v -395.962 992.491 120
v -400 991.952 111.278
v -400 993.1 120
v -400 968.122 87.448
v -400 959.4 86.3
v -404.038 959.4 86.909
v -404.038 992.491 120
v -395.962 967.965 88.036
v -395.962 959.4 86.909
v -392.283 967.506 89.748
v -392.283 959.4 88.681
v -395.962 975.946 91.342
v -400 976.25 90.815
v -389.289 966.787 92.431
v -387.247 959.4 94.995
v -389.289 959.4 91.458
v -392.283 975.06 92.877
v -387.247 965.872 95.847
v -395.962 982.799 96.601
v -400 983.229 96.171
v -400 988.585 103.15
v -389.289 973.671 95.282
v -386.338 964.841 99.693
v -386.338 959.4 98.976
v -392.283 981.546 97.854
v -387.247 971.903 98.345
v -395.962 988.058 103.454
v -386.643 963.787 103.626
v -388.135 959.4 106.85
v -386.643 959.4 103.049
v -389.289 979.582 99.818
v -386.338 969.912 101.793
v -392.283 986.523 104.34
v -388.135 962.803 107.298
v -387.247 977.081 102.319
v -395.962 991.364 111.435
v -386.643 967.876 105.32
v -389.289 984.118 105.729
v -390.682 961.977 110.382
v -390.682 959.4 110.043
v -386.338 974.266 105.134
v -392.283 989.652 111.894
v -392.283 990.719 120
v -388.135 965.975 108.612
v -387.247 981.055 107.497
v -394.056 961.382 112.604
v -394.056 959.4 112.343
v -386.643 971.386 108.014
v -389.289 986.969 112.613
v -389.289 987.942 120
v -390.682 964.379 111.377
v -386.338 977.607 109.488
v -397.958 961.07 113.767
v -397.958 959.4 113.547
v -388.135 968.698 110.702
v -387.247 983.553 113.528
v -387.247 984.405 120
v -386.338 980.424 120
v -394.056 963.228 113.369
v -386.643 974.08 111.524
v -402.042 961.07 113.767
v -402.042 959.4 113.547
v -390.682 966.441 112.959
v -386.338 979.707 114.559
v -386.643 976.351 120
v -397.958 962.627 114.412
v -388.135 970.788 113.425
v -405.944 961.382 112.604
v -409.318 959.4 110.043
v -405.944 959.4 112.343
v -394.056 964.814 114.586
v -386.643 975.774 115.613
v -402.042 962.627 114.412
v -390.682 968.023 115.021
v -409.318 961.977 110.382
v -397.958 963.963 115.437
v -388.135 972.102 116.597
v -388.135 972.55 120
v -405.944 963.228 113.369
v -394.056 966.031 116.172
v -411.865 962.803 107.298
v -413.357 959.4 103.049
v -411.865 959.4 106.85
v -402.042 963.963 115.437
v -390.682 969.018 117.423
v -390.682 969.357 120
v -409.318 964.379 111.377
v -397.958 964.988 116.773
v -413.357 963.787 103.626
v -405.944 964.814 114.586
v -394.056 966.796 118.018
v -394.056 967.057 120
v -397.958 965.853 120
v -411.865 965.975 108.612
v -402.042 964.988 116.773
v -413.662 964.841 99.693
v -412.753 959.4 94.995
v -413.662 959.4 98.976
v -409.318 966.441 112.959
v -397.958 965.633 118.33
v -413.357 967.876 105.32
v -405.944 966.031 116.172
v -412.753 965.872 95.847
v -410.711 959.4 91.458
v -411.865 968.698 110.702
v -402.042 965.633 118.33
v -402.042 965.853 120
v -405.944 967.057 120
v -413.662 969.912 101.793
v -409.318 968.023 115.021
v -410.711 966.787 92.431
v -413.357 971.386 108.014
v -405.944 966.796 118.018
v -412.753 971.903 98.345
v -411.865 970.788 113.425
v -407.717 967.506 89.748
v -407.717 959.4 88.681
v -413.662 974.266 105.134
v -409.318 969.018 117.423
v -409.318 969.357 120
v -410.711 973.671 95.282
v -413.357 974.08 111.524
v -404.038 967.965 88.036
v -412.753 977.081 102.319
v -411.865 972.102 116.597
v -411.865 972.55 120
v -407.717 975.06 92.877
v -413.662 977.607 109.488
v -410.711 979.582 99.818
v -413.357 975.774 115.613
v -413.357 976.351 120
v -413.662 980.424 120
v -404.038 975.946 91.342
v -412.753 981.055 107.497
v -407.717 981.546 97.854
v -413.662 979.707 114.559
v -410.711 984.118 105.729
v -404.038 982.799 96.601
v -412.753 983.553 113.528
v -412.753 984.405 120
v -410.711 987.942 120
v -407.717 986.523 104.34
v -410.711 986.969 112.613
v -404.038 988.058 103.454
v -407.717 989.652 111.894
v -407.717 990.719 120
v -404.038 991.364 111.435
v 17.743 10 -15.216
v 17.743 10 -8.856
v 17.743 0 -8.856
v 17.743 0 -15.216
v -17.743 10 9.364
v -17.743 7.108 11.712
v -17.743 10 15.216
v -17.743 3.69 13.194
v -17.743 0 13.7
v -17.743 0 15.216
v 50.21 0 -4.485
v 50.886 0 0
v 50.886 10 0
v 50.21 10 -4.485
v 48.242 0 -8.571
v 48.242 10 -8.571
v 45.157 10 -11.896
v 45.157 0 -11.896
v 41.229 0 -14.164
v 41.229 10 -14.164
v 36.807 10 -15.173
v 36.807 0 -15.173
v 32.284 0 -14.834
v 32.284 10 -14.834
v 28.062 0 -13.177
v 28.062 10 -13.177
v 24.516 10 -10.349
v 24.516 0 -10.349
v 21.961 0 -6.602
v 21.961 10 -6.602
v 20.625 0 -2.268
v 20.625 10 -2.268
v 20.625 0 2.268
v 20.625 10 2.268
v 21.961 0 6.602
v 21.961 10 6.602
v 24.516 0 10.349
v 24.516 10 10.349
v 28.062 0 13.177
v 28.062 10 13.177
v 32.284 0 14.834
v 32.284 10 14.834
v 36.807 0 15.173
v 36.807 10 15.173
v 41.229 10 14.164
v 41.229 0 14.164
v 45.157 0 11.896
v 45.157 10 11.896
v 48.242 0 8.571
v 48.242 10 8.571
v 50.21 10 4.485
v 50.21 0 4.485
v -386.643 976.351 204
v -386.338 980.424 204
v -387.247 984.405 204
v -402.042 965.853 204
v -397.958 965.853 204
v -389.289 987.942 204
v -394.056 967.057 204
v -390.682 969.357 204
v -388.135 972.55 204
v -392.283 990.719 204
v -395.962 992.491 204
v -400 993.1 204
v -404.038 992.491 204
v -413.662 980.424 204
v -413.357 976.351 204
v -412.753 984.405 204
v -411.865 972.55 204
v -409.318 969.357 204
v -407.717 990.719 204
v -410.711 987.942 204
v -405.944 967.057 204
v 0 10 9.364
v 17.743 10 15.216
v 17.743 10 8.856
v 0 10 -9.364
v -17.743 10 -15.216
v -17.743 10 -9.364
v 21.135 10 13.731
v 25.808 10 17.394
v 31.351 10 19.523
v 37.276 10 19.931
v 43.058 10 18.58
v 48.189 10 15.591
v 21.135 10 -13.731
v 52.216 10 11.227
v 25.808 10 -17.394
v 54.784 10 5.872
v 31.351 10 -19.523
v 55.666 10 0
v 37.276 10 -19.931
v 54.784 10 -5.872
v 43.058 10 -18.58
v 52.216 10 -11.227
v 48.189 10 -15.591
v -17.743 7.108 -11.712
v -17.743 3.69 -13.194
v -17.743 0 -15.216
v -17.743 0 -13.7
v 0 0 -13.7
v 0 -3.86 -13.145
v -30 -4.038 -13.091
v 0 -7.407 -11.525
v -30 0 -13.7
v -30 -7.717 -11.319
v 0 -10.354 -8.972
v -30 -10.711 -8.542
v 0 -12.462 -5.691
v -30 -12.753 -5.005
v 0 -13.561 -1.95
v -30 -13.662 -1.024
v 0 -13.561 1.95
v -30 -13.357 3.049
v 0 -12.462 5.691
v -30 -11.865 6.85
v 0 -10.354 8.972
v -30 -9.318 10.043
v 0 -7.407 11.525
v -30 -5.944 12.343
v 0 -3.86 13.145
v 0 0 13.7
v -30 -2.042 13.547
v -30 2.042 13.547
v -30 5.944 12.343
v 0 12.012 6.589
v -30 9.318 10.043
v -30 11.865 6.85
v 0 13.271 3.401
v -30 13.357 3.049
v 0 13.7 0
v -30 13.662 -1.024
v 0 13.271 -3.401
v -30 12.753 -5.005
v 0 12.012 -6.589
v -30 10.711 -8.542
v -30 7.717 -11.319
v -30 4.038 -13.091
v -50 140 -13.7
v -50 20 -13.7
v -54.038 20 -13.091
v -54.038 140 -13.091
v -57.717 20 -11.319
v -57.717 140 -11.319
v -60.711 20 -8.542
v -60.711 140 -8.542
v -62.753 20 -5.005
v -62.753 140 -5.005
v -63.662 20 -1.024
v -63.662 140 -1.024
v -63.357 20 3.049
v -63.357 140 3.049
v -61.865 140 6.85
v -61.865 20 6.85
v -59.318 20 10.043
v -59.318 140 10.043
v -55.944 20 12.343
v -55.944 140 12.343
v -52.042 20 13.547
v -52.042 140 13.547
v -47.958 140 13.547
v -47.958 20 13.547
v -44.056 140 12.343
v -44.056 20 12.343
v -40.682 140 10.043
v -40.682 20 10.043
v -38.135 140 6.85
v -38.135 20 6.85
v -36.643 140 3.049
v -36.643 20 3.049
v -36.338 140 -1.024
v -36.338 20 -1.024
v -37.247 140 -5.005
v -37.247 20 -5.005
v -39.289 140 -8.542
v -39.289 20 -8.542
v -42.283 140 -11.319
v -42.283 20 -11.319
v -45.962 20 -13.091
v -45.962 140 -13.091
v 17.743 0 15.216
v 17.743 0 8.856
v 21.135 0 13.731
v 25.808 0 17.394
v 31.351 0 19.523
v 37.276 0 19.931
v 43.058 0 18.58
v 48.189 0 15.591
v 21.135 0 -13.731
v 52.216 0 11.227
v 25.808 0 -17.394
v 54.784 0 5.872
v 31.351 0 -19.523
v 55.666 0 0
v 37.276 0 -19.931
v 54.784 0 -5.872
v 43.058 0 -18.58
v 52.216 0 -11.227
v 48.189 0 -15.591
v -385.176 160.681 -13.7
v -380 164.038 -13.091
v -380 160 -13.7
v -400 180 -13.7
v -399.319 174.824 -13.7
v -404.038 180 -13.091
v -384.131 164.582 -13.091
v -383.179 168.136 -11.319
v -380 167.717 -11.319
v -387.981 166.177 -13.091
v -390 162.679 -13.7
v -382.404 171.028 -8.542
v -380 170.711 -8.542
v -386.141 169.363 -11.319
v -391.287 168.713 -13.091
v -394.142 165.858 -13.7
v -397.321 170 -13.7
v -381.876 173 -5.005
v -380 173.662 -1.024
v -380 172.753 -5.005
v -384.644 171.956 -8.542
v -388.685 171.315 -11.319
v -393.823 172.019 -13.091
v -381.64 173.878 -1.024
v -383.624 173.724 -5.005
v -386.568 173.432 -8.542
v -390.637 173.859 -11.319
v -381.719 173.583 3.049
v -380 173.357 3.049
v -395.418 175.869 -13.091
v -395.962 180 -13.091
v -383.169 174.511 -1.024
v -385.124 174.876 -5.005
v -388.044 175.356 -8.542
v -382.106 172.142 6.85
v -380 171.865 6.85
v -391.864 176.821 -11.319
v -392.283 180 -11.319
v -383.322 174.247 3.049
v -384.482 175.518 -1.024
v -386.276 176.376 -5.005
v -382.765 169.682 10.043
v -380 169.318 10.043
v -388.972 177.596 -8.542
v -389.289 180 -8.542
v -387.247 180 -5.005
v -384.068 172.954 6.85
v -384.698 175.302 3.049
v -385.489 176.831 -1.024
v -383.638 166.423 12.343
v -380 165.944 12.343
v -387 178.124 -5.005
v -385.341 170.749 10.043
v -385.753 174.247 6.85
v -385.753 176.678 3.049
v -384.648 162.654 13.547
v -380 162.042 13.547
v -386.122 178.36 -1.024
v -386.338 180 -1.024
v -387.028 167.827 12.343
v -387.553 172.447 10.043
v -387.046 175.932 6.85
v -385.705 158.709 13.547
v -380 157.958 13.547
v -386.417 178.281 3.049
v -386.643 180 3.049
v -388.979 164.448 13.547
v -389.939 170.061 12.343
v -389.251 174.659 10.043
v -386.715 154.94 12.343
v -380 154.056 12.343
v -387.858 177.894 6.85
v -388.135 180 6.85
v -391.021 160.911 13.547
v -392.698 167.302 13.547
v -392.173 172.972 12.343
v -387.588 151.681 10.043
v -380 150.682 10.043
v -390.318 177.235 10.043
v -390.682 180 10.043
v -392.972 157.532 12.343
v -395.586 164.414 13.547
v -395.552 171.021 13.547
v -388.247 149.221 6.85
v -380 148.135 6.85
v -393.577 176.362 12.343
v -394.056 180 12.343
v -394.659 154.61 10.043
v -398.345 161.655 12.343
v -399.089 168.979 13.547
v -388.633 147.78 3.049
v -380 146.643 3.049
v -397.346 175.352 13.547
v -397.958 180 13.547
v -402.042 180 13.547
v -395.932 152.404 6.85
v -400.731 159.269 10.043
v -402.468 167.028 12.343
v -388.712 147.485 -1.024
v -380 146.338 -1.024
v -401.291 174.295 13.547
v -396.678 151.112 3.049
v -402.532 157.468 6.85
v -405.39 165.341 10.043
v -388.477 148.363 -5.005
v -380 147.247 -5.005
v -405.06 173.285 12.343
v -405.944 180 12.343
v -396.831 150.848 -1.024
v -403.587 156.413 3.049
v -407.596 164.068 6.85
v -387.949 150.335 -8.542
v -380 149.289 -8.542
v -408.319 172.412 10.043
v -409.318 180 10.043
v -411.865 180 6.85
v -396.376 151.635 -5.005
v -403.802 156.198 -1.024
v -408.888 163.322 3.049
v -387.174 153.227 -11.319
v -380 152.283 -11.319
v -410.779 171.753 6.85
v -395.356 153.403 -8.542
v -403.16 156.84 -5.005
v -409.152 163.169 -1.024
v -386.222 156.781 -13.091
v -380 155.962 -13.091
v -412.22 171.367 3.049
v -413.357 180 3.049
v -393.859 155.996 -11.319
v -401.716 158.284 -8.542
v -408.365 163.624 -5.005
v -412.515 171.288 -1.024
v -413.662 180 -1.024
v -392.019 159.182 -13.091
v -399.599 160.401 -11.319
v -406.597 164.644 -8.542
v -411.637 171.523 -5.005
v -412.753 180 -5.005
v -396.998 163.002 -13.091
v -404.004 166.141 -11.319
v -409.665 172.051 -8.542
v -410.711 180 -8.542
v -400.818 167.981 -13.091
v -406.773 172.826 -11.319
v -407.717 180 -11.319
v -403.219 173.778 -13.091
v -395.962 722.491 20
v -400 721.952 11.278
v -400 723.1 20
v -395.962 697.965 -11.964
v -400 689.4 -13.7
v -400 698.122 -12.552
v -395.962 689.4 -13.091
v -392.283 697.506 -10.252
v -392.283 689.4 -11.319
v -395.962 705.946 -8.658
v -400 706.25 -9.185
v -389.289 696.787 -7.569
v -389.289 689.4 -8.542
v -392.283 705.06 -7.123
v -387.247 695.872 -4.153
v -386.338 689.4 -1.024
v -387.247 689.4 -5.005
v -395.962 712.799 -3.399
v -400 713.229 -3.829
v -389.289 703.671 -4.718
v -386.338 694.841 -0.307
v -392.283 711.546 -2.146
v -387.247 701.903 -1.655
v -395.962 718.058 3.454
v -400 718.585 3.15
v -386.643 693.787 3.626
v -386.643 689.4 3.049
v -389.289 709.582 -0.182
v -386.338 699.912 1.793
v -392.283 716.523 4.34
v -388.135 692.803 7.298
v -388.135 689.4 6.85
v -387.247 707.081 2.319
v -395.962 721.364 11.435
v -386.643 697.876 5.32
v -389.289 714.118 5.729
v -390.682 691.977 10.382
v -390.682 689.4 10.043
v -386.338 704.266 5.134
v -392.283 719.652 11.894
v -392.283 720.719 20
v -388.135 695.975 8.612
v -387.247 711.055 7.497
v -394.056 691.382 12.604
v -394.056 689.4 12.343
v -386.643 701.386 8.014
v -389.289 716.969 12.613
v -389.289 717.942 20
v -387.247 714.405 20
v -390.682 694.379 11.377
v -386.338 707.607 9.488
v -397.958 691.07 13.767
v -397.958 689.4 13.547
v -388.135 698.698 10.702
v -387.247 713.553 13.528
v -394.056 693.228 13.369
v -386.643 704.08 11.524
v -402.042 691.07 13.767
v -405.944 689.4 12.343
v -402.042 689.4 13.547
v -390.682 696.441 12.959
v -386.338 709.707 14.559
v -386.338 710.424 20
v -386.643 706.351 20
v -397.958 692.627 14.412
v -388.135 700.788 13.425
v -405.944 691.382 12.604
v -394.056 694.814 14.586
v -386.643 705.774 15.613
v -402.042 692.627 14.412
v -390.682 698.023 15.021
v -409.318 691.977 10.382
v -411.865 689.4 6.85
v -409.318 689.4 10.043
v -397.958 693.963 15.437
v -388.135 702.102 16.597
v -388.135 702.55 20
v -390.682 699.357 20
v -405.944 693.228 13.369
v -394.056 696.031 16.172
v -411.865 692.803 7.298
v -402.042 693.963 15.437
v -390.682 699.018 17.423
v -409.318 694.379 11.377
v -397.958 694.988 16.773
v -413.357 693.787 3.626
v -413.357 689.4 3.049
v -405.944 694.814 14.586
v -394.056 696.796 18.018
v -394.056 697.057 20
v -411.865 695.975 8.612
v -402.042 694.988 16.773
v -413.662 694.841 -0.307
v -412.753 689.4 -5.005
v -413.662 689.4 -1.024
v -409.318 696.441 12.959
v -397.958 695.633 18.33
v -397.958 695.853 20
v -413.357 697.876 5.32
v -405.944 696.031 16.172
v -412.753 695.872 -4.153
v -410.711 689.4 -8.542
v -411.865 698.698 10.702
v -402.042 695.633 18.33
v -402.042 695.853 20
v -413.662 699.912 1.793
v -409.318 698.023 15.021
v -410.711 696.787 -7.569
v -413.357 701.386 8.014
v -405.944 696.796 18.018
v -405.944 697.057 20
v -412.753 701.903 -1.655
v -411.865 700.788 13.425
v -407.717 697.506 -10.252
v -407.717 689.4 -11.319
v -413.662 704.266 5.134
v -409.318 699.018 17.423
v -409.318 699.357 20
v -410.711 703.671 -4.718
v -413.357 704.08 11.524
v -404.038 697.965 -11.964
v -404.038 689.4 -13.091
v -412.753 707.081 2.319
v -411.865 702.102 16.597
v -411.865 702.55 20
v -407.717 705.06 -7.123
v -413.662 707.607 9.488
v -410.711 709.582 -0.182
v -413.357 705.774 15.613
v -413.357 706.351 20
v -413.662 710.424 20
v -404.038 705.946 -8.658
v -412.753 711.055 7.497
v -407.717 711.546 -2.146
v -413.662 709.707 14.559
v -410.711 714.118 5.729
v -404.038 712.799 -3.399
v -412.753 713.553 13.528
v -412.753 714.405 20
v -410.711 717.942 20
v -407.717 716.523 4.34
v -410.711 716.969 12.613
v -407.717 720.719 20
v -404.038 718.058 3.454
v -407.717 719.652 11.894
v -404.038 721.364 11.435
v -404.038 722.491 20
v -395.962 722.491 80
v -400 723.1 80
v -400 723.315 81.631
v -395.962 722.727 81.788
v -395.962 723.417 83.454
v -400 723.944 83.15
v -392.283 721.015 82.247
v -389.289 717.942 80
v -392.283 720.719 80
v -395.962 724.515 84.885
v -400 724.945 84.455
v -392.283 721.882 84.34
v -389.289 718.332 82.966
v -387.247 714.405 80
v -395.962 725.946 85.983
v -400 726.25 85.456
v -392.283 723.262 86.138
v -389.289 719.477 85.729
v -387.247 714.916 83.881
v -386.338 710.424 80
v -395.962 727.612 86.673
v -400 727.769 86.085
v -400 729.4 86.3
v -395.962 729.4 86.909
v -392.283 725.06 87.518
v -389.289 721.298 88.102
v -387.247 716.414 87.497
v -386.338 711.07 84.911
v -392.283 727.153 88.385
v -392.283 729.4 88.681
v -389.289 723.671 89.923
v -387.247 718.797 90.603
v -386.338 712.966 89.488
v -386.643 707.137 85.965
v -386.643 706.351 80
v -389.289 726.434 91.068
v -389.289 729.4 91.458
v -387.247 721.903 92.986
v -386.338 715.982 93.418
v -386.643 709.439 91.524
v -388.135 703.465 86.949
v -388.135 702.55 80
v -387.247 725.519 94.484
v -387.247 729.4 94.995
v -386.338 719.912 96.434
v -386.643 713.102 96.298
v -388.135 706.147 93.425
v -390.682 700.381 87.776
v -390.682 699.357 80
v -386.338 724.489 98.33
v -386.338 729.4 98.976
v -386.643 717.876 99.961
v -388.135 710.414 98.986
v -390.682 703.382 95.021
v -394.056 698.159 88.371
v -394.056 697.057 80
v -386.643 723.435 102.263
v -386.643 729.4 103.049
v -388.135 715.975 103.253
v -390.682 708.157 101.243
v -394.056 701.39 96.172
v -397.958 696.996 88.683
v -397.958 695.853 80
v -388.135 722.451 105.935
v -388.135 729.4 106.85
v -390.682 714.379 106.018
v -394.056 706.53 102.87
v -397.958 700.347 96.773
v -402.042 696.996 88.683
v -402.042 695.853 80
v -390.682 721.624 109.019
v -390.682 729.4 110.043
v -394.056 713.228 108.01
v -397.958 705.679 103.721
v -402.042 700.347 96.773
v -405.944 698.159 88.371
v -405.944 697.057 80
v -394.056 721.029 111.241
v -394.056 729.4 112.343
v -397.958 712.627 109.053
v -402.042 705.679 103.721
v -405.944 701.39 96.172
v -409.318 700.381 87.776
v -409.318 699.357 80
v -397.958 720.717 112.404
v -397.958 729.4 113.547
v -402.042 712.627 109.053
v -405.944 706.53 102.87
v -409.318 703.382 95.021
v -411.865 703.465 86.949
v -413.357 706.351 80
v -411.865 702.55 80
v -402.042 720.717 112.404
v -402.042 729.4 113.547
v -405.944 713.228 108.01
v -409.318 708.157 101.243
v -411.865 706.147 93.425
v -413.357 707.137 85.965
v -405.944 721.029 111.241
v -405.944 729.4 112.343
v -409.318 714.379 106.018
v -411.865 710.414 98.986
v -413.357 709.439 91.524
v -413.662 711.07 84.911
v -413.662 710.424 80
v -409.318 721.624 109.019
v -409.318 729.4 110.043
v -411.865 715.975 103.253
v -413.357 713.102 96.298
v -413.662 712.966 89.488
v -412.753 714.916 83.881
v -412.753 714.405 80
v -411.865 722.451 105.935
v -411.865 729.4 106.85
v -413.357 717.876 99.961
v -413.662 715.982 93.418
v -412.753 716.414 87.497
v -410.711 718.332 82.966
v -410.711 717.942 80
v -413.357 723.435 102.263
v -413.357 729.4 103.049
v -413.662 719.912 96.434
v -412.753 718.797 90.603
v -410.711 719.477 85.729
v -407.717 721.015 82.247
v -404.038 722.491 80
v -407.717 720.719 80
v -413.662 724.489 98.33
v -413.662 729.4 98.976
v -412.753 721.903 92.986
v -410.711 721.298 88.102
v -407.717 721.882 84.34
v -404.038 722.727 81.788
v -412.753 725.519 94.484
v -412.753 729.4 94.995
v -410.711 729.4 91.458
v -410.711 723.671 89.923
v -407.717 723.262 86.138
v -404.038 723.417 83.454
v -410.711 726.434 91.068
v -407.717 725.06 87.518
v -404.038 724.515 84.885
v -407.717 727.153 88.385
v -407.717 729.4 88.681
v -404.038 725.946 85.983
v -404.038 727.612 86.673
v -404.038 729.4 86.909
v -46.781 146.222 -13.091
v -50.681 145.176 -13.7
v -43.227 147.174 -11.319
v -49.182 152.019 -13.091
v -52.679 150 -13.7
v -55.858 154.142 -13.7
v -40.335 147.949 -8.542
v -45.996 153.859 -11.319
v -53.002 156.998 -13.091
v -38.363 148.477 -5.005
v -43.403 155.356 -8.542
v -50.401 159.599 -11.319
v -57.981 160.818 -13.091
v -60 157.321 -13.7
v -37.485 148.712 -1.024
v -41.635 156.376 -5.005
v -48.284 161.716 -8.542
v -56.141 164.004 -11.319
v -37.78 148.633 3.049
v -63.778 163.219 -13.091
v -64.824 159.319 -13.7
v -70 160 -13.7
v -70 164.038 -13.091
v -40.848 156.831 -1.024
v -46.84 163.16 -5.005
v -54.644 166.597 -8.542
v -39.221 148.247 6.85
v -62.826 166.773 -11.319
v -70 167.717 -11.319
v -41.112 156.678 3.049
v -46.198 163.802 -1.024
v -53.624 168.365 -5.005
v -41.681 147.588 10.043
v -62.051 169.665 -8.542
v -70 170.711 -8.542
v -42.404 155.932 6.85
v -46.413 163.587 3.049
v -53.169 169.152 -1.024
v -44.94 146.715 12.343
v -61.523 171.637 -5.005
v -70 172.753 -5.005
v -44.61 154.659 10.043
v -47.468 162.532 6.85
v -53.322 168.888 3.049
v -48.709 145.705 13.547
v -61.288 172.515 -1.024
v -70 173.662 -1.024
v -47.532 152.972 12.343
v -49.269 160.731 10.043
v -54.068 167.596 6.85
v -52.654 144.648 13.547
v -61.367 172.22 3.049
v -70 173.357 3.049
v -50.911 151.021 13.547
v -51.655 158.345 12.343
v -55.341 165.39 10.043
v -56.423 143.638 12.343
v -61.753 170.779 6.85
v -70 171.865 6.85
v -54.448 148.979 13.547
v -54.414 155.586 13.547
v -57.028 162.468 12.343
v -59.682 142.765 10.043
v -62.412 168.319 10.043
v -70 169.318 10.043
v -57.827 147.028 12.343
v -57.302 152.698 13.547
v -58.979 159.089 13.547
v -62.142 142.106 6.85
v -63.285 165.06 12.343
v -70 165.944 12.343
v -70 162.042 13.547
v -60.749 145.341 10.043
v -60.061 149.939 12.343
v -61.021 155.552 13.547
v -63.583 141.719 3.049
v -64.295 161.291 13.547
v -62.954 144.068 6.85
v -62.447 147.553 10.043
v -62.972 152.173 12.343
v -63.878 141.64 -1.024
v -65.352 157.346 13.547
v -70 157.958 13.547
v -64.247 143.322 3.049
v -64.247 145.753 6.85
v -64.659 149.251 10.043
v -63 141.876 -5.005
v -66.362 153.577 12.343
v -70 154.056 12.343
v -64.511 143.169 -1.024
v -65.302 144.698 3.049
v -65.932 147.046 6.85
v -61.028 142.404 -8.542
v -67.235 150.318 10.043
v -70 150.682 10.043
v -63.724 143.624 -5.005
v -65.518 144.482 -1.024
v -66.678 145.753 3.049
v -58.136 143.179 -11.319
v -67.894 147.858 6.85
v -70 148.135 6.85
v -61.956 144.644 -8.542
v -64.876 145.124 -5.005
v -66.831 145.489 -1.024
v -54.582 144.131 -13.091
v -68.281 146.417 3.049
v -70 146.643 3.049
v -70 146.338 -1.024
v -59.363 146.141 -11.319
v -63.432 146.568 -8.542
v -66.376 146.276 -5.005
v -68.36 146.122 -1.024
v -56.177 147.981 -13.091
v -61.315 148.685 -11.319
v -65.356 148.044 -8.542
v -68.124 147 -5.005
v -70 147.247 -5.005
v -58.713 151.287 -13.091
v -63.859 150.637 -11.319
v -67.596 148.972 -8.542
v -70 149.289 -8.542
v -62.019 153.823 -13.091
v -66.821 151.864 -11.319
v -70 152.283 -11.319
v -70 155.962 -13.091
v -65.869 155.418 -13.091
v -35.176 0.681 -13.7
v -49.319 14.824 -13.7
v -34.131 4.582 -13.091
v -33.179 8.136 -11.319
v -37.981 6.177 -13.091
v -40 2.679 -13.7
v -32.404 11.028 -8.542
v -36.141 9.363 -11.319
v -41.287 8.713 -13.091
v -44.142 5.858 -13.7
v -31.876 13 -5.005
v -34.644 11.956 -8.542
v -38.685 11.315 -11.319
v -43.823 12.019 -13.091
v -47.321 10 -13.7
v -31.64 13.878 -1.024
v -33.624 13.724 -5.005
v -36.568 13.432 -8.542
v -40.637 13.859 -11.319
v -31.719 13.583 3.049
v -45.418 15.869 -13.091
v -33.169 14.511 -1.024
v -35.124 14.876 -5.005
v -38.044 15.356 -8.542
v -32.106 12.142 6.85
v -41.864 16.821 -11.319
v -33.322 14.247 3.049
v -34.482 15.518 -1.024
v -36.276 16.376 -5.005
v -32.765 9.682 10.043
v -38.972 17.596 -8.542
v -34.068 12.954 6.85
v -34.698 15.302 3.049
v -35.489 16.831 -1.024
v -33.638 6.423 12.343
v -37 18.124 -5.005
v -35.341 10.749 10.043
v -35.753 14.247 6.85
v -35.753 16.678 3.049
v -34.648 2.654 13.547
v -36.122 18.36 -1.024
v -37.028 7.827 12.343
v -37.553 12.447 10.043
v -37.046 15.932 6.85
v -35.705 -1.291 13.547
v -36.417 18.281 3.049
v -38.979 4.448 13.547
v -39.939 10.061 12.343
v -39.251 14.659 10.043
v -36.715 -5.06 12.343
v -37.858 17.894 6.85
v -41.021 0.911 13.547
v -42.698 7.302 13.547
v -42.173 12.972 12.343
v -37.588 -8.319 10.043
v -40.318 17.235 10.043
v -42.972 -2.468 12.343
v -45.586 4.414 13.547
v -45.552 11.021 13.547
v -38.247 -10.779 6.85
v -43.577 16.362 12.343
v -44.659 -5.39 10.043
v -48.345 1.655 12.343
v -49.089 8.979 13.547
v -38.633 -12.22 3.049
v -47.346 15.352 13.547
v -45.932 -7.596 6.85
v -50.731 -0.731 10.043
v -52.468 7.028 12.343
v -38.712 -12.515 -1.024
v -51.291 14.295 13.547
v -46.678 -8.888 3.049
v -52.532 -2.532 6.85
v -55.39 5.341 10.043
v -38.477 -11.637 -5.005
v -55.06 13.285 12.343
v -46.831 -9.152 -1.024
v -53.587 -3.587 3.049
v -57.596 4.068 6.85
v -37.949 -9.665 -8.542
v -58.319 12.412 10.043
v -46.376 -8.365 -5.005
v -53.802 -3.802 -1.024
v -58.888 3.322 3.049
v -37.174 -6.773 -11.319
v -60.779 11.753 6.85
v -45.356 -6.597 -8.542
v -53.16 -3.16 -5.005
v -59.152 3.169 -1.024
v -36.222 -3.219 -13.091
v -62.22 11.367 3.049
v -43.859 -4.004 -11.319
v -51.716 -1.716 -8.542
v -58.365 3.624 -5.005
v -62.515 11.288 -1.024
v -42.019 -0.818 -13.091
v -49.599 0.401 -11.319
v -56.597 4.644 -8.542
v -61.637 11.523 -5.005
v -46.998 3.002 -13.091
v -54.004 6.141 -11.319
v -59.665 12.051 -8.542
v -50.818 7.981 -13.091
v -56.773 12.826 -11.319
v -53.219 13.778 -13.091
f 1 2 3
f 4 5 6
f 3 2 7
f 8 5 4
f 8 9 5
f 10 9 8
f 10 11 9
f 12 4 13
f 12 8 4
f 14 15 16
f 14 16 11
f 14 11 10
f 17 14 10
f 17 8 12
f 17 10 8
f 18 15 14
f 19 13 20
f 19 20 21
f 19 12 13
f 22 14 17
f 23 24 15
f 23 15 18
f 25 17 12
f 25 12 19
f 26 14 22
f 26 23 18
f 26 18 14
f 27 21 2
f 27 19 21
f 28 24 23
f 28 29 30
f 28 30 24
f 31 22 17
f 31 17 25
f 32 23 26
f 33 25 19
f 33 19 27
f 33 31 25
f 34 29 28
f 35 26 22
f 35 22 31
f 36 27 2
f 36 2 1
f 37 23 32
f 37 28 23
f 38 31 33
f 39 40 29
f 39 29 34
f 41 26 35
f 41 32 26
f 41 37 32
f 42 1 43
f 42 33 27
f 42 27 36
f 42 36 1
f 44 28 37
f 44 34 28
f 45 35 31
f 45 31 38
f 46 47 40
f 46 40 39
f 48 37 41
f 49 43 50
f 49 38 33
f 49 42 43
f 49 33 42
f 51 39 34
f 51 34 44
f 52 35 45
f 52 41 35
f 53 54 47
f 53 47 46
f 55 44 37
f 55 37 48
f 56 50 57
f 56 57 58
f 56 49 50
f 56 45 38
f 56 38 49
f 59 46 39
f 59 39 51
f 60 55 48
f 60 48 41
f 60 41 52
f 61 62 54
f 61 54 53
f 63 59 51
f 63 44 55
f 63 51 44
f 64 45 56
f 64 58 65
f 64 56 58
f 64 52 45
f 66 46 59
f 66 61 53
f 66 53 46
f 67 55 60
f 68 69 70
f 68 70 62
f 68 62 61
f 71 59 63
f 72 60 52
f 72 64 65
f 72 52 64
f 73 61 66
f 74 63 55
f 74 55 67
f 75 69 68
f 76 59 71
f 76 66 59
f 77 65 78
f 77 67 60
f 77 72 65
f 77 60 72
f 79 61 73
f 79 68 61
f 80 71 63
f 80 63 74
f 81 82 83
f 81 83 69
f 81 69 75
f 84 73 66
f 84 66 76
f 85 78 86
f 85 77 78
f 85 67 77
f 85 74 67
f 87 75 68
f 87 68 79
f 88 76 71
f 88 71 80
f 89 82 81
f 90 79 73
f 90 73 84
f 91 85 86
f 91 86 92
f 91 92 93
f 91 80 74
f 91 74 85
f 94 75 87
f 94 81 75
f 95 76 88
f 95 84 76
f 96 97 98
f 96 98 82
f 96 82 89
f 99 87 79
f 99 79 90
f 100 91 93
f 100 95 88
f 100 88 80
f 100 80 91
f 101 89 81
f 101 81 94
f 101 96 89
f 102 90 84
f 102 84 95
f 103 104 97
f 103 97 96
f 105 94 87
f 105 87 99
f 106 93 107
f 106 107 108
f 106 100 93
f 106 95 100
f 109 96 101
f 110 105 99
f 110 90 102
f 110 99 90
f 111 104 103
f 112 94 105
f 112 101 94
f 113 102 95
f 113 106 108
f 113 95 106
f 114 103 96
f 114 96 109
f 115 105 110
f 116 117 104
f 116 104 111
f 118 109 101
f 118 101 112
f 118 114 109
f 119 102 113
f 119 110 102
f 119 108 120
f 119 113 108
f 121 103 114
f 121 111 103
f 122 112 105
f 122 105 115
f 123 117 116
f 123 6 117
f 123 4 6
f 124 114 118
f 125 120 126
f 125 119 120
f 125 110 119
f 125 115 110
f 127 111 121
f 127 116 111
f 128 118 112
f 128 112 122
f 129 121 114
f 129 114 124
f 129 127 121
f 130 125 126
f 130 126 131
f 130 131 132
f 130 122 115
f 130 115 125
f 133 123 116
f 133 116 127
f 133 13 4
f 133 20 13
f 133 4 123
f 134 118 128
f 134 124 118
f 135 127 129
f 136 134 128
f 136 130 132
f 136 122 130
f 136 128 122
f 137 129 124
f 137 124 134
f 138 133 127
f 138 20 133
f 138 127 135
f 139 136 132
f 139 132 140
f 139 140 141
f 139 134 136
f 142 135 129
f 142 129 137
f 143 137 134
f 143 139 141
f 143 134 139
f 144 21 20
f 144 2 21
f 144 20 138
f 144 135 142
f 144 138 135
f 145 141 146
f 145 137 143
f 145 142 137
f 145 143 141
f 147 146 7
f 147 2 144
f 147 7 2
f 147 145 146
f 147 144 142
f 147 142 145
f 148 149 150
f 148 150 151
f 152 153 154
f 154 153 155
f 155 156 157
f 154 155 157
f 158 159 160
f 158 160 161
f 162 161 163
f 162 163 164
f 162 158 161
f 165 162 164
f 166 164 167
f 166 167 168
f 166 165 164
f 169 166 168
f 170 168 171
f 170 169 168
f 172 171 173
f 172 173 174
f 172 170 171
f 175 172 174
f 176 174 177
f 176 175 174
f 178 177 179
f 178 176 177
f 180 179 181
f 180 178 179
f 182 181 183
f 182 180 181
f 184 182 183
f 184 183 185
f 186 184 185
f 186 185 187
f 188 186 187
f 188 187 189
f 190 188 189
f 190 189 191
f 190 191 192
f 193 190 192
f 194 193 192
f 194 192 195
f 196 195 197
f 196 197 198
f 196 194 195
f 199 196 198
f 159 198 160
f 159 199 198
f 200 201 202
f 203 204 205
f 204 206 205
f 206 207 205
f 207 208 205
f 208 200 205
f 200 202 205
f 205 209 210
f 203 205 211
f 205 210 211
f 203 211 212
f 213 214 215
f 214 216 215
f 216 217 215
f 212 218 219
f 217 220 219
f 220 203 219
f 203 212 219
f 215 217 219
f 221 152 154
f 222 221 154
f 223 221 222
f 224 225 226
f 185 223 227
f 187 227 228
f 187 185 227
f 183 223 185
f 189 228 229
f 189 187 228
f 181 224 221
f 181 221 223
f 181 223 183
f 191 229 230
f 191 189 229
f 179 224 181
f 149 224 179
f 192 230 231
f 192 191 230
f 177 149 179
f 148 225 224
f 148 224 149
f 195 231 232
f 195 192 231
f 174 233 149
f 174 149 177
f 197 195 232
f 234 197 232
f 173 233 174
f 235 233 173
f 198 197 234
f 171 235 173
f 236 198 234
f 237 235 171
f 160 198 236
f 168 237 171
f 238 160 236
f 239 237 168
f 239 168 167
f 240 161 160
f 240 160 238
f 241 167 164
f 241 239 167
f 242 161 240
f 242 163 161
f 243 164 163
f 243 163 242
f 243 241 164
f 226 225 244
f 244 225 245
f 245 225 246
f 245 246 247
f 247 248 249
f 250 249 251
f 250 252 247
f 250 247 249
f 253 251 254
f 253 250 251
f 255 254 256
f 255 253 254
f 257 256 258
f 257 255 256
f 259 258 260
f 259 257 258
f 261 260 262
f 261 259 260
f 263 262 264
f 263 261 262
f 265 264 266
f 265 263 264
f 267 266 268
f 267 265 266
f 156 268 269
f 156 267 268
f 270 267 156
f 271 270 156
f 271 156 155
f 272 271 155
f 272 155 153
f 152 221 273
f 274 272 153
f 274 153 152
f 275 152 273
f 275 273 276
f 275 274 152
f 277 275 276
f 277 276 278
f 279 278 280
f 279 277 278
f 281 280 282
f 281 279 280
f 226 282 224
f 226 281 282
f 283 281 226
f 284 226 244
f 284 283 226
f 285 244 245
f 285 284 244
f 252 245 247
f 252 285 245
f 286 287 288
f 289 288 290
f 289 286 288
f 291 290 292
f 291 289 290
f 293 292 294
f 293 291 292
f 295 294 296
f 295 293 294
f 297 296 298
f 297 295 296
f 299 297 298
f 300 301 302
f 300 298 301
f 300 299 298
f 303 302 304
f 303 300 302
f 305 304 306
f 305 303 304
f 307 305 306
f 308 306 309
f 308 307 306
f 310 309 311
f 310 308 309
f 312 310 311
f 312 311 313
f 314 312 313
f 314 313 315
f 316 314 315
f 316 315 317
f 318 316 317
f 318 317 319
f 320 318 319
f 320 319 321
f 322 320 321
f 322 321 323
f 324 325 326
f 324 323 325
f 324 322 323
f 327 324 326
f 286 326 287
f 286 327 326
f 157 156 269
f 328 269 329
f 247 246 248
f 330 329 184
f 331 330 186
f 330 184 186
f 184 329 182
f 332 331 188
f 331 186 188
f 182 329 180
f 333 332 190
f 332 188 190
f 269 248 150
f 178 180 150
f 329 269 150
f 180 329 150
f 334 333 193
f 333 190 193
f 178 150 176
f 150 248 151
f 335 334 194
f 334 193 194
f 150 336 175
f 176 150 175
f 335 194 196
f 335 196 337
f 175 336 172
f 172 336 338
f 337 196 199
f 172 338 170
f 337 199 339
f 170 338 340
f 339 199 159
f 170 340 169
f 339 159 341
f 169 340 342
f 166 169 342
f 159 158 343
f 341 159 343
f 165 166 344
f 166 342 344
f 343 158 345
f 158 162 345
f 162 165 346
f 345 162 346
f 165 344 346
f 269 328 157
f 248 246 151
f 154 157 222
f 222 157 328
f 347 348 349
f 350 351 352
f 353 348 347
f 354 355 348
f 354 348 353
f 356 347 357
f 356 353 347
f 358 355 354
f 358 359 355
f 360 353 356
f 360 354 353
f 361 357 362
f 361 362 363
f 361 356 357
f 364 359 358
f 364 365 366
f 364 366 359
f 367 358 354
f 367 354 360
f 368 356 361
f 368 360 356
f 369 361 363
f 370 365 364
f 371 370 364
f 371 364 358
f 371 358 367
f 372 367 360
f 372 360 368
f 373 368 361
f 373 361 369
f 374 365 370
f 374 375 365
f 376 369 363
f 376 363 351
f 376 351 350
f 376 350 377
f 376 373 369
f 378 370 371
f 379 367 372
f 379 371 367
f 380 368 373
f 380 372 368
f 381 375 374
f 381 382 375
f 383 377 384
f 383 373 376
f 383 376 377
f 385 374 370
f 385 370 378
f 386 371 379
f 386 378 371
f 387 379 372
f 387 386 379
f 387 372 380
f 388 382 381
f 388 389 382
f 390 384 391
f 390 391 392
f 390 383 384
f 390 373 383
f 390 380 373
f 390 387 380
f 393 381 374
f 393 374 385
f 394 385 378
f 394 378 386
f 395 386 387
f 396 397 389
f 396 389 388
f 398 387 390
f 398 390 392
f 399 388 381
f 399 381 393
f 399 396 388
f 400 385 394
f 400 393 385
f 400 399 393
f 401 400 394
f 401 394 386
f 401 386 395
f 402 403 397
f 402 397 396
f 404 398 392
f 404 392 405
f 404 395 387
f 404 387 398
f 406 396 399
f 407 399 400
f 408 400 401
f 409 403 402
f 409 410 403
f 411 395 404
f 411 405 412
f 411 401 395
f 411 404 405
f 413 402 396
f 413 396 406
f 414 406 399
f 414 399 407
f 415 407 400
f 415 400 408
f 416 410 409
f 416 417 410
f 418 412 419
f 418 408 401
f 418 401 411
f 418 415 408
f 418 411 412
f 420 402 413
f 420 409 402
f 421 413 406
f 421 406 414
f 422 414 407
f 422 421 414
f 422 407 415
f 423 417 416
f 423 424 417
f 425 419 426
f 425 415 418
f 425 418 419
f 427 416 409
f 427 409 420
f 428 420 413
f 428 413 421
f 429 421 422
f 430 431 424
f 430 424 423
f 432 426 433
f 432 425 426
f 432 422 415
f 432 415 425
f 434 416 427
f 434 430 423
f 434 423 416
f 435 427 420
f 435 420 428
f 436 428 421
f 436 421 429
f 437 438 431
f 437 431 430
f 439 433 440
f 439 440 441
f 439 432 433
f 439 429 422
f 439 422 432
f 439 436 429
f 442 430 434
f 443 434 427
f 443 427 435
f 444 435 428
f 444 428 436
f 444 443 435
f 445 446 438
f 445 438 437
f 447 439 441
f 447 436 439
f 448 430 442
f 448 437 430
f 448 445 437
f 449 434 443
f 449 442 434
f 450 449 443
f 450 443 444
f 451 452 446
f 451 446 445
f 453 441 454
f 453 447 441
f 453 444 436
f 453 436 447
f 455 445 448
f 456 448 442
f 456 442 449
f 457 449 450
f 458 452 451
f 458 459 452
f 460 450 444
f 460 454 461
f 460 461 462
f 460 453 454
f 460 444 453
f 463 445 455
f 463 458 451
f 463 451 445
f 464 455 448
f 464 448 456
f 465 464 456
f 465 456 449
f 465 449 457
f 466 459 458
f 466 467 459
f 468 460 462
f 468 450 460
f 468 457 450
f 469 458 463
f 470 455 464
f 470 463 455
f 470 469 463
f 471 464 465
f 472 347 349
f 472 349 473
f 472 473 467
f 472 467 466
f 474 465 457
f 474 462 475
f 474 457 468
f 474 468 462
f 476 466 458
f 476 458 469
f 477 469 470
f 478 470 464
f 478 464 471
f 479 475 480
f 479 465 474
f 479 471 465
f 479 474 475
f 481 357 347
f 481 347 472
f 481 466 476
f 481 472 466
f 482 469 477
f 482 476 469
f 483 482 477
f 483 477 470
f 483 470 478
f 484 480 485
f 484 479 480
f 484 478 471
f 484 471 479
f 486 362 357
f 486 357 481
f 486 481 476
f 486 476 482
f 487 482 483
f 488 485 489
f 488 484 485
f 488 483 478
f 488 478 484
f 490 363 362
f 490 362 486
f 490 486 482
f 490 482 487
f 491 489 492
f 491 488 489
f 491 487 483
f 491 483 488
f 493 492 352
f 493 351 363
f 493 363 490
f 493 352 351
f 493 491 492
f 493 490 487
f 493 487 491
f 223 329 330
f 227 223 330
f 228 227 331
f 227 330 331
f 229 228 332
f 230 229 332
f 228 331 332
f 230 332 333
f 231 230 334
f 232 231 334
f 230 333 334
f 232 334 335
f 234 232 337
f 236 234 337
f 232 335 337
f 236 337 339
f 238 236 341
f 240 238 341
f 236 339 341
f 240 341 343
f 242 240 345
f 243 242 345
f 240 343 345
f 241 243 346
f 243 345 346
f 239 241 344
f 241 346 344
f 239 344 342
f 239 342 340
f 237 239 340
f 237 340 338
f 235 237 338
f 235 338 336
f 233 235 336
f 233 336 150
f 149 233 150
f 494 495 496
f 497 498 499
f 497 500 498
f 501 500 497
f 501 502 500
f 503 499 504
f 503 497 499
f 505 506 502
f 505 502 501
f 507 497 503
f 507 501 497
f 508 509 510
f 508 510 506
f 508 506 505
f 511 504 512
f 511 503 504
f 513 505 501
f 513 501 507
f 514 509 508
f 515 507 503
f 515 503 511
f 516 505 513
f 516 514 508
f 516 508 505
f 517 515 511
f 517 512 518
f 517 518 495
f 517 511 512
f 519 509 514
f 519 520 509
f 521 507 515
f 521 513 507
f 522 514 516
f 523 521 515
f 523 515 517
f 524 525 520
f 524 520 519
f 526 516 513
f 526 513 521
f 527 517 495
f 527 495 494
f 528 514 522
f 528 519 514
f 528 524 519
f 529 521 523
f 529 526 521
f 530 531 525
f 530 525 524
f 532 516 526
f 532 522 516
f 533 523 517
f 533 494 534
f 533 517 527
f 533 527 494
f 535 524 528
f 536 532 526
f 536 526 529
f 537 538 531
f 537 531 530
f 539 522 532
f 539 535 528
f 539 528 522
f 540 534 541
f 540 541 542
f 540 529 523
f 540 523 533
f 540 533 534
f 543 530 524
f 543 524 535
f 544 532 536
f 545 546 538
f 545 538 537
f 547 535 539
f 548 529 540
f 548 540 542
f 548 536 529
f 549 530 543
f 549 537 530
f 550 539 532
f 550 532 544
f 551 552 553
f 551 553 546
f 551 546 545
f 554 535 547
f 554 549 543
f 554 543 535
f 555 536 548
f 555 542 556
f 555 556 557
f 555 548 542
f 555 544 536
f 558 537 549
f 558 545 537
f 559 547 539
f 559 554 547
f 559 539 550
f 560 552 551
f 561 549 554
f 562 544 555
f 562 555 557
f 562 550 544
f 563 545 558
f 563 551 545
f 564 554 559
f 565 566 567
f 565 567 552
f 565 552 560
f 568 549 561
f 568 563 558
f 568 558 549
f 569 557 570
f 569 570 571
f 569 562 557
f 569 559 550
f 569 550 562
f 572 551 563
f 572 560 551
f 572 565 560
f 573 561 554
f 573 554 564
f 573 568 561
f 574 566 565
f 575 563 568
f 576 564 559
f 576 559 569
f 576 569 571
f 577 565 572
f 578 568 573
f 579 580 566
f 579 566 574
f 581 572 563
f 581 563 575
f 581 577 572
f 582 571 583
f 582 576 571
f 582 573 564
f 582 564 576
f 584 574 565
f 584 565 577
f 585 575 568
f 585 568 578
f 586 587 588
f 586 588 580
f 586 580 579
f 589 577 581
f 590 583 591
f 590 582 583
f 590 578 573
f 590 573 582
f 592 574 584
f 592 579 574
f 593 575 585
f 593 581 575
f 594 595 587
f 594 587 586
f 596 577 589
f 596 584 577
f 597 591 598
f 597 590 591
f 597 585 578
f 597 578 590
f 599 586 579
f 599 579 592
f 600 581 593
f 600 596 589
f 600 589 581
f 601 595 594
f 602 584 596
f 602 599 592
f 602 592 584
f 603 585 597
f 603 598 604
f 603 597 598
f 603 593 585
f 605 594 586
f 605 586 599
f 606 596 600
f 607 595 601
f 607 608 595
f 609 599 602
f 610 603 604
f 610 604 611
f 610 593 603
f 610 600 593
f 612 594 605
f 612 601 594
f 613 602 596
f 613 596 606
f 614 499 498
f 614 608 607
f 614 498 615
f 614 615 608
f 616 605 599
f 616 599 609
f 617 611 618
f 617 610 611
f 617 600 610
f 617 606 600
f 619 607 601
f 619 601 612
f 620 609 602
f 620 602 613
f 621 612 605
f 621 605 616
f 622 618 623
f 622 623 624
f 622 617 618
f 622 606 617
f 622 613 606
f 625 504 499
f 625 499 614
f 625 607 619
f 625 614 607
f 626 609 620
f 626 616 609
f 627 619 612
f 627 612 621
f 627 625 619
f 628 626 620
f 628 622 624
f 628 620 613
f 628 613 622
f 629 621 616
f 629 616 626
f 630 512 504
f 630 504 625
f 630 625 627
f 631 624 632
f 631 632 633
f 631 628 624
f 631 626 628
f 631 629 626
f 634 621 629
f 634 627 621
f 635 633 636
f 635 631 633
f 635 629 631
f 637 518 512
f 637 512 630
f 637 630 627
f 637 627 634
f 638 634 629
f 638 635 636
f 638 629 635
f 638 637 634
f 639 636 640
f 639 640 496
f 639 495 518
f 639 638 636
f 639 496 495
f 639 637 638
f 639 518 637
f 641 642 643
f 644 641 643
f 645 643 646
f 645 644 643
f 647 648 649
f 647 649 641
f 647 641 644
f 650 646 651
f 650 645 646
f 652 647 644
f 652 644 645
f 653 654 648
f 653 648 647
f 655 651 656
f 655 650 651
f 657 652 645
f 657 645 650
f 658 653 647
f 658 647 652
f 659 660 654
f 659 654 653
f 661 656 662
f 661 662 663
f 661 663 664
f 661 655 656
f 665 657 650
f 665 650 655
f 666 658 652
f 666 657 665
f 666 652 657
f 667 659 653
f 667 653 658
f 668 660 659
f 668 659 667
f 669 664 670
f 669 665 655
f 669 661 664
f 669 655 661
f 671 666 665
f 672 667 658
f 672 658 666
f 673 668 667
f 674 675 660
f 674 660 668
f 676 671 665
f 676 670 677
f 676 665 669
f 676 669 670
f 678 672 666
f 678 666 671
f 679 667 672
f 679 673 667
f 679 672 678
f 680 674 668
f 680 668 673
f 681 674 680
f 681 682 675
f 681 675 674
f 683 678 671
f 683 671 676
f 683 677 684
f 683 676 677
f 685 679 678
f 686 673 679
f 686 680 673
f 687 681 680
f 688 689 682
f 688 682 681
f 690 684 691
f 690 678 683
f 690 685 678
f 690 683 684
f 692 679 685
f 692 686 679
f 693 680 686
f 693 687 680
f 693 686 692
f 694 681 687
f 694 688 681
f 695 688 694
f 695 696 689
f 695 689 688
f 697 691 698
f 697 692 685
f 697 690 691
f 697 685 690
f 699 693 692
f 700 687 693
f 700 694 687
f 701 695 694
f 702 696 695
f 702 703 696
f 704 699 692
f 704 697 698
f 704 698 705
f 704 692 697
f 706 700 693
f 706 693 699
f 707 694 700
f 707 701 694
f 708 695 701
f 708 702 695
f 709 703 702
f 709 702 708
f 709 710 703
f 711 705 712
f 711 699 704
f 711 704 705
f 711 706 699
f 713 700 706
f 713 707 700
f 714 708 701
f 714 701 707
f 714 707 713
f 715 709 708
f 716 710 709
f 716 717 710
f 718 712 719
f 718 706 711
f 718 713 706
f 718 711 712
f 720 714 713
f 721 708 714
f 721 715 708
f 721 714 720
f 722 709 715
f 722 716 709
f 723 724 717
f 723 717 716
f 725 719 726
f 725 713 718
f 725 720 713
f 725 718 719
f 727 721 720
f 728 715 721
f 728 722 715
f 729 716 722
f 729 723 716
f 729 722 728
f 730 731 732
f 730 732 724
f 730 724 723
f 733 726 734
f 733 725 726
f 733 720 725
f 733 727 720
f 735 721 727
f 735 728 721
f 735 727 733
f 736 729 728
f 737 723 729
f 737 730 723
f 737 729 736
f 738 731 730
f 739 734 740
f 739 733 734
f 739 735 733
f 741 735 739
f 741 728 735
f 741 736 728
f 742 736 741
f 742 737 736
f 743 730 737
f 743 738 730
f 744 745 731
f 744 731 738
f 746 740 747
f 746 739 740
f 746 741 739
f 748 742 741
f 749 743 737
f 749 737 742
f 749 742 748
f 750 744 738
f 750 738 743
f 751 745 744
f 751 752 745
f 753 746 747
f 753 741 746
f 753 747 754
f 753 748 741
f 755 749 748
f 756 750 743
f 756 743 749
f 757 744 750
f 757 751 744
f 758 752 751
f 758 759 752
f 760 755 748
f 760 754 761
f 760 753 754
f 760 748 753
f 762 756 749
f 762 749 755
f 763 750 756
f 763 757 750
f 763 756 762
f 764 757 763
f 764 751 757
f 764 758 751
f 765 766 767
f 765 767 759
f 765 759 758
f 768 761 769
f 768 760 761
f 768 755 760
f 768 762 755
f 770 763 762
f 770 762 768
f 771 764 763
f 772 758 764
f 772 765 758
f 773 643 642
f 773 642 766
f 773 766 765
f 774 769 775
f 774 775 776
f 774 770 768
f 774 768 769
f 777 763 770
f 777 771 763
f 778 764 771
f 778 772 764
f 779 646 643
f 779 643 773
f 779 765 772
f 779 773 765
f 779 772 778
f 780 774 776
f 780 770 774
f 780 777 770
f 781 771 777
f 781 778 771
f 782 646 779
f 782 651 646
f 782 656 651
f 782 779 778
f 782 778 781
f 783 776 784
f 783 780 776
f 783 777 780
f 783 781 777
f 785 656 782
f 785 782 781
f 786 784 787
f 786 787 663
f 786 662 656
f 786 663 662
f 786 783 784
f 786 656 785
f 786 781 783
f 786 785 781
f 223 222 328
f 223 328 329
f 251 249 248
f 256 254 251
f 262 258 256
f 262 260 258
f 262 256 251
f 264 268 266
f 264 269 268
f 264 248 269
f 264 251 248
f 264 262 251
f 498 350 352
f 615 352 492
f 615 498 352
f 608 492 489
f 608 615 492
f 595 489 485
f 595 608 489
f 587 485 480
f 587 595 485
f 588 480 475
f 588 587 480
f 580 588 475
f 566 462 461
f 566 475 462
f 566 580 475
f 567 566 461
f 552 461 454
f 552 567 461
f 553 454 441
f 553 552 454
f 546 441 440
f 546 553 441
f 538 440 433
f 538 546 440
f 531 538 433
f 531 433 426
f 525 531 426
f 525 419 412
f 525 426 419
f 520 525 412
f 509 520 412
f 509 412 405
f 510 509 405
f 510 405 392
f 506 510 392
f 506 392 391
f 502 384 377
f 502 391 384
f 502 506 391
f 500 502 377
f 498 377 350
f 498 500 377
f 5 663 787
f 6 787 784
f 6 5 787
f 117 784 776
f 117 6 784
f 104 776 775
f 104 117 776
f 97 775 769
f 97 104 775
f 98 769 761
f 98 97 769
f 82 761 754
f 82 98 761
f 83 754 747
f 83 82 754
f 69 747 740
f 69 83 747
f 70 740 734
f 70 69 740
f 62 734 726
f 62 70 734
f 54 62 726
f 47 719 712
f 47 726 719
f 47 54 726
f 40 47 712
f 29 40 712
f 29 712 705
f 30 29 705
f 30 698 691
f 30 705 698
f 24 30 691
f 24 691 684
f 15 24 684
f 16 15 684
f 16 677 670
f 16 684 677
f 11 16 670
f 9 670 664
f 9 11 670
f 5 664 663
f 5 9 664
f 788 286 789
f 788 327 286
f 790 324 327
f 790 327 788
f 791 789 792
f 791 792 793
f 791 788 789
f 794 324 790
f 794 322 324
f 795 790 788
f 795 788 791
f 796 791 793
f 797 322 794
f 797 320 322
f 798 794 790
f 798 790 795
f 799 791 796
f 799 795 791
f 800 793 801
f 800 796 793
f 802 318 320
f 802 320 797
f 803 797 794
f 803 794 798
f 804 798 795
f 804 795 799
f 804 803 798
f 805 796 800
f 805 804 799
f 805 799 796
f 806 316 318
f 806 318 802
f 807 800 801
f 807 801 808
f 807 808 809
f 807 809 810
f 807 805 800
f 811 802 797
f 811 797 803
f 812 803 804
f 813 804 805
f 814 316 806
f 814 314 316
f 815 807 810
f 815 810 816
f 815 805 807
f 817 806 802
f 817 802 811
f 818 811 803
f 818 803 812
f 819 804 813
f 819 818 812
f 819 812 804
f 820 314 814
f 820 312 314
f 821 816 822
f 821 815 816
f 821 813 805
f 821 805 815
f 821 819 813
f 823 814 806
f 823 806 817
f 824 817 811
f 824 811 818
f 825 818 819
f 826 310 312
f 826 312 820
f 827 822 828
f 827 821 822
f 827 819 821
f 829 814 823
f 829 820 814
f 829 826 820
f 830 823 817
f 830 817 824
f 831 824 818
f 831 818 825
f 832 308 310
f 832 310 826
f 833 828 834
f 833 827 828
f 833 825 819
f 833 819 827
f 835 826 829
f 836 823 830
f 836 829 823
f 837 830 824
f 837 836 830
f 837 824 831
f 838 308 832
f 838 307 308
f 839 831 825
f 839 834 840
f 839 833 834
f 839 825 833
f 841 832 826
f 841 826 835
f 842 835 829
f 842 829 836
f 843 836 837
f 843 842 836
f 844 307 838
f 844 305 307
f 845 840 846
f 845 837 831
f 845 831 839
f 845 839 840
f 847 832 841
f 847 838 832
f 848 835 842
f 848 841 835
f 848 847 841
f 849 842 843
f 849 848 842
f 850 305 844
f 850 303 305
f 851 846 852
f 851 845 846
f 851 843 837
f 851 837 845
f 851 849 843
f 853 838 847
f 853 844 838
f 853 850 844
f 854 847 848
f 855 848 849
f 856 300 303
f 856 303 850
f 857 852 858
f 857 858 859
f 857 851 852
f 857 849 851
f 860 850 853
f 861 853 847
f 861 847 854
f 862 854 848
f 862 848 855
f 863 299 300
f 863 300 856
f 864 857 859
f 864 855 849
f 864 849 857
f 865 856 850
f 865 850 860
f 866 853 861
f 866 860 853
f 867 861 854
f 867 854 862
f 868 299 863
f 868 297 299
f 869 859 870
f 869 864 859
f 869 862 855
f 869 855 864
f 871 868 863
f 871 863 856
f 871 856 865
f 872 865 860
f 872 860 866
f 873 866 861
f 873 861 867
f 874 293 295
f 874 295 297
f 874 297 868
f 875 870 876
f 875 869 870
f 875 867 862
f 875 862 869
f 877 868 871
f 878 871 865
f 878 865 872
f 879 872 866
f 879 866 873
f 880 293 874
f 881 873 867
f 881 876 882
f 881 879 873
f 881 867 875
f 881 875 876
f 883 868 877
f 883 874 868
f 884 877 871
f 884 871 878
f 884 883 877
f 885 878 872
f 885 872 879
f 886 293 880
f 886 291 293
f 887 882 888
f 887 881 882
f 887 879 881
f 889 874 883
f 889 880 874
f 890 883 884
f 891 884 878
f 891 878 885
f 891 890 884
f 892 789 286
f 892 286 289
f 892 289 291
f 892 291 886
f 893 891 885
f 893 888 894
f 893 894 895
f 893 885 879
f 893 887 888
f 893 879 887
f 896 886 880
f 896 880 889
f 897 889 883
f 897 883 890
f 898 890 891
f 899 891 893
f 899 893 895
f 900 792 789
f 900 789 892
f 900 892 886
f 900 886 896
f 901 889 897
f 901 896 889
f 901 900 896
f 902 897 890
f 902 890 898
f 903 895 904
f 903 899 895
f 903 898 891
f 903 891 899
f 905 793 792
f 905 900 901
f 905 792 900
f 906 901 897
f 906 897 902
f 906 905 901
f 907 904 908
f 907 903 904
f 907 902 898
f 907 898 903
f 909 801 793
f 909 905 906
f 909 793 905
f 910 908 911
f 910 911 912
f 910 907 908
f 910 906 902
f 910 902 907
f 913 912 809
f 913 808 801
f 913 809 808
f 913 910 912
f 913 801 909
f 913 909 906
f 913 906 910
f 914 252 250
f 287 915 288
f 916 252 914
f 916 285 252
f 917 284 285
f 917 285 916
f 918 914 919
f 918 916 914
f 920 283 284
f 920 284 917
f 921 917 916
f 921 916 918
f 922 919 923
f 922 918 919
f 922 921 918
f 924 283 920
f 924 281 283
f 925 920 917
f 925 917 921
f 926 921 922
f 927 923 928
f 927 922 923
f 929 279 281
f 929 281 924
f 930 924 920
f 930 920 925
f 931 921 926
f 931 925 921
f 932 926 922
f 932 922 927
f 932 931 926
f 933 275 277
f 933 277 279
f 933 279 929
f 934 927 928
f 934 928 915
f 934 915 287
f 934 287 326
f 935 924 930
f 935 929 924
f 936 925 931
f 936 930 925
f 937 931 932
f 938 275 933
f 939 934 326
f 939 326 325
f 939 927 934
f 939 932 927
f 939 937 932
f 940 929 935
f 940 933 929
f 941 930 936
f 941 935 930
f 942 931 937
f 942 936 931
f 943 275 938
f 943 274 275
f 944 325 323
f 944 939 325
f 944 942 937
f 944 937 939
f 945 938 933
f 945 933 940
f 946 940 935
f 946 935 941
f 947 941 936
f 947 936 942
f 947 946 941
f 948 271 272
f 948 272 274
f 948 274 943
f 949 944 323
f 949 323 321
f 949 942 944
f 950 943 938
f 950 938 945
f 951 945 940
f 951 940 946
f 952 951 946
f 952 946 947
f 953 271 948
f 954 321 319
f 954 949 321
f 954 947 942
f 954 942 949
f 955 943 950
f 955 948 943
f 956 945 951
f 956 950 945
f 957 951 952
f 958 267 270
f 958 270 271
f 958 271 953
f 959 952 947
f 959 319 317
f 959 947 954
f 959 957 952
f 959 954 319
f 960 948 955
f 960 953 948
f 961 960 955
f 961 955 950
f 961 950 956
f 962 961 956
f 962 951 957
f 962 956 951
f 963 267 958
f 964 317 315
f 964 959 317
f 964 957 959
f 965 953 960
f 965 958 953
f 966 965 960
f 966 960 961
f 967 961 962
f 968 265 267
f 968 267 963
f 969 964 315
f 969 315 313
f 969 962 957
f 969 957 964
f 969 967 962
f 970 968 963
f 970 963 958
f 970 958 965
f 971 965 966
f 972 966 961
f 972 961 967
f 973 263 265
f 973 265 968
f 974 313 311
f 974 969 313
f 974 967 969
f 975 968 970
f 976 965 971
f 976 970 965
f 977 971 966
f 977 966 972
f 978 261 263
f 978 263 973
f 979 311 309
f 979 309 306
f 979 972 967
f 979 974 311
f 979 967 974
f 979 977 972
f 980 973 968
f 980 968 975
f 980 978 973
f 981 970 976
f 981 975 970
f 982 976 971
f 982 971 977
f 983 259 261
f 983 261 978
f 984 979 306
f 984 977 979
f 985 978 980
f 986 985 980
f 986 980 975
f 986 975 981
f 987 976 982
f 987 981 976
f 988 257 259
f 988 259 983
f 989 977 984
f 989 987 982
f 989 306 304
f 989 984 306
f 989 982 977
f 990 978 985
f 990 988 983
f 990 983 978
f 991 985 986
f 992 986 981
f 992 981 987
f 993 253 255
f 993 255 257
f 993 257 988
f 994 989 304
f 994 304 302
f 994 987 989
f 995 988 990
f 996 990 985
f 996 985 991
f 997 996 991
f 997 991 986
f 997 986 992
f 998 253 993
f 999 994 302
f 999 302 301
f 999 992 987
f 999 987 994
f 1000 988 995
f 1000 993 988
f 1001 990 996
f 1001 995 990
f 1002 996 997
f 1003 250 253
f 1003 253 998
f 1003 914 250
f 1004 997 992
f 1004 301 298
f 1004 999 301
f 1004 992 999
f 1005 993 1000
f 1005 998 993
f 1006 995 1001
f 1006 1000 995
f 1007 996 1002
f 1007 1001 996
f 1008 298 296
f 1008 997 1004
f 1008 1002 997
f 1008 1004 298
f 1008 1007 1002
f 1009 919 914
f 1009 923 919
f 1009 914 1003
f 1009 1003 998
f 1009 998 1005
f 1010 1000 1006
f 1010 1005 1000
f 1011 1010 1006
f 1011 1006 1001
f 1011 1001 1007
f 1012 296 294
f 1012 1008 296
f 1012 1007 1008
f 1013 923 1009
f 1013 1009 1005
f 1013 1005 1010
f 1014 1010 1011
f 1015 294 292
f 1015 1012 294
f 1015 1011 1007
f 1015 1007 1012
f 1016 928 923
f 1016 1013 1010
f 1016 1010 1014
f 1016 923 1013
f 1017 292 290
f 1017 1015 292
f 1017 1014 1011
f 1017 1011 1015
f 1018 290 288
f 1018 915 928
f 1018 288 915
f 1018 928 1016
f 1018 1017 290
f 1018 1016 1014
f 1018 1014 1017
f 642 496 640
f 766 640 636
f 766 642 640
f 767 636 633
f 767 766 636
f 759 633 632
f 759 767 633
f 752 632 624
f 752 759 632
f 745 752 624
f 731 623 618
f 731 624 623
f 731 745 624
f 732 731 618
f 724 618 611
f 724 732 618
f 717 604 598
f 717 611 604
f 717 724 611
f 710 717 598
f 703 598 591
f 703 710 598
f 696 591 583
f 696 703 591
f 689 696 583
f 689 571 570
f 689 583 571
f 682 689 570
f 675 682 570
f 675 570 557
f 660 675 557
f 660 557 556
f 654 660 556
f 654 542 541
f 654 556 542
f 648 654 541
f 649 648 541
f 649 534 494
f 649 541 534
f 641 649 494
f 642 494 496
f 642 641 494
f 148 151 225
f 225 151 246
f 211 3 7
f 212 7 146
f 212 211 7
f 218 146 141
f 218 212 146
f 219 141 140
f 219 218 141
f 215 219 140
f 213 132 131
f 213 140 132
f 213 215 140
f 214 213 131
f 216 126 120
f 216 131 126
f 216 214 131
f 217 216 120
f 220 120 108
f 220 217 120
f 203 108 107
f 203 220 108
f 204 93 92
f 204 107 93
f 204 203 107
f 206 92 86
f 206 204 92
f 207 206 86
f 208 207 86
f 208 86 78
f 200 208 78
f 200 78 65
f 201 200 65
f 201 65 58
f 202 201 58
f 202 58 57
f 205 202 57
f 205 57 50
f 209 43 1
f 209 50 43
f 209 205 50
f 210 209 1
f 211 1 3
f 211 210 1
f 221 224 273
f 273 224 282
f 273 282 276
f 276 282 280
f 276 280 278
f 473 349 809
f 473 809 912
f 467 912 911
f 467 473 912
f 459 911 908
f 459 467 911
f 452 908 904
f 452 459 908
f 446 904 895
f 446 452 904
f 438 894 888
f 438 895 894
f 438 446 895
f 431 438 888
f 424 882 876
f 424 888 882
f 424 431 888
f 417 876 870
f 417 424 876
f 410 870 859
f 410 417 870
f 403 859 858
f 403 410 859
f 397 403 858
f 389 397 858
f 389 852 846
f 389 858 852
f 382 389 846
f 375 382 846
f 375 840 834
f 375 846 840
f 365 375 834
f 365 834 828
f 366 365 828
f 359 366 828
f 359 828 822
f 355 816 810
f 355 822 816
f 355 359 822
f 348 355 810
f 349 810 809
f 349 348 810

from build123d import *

# Parameters (mm, degrees)
CROQUIS1_R              = 13.7
CROQUIS2_R              = 19.995357147
CROQUIS2_R_2            = 15.215534834
SALIENTE_EXTRUIR1_DEPTH = 10


with BuildPart() as part:
    # Barrer1: sweep along a curve in space
    with BuildLine() as barrer1_path:
        Line((0, 0, 0), (-30, 0, 0))
        ThreePointArc((-30, 0, 0), (-44.142135624, 5.857864376, 0), (-50, 20, 0))
        Line((-50, 20, 0), (-50, 140, 0))
        ThreePointArc((-50, 140, 0), (-55.857864376, 154.142135624, 0), (-70, 160, 0))
        Line((-70, 160, 0), (-380, 160, 0))
        ThreePointArc((-380, 160, 0), (-394.142135624, 165.857864376, 0), (-400, 180, 0))
        Line((-400, 180, 0), (-400, 689.4, 0))
        ThreePointArc((-400, 689.4, 0), (-400, 703.542135624, 5.857864376), (-400, 709.4, 20))
        Line((-400, 709.4, 20), (-400, 709.4, 80))
        ThreePointArc((-400, 709.4, 80), (-400, 715.257864376, 94.142135624), (-400, 729.4, 100))
        Line((-400, 729.4, 100), (-400, 959.4, 100))
        ThreePointArc((-400, 959.4, 100), (-400, 973.542135624, 105.857864376), (-400, 979.4, 120))
        Line((-400, 979.4, 120), (-400, 979.4, 204))
    # Croquis1 → Barrer1 (sweep)
    with BuildSketch(Plane(origin=(0, 0, 0), x_dir=(0, 0, -1), z_dir=(1, 0, 0))):
        Circle(CROQUIS1_R)
    sweep(path=barrer1_path.line)

    # Croquis2 → Saliente-Extruir1 (add)
    with BuildSketch(Plane(origin=(0, 0, 0), x_dir=(1, 0, 0), z_dir=(0, 1, 0))):
        with BuildLine():
            Line((17.743007843, -15.215534834), (17.743007843, -8.856143388))
            ThreePointArc((17.743007843, -8.856143388), (15.67480975, 0), (17.743007843, 8.856143388))
            Line((17.743007843, 8.856143388), (17.743007843, 15.215534834))
            Line((17.743007843, 15.215534834), (-17.743007843, 15.215534834))
            Line((-17.743007843, 15.215534834), (-17.743007843, -15.215534834))
            Line((-17.743007843, -15.215534834), (17.743007843, -15.215534834))
        make_face()
        with Locations((35.670166897, 0)):
            Circle(CROQUIS2_R)
        with Locations((35.670166897, 0)):
            Circle(CROQUIS2_R_2, mode=Mode.SUBTRACT)
    extrude(amount=SALIENTE_EXTRUIR1_DEPTH)


solid = part.part
